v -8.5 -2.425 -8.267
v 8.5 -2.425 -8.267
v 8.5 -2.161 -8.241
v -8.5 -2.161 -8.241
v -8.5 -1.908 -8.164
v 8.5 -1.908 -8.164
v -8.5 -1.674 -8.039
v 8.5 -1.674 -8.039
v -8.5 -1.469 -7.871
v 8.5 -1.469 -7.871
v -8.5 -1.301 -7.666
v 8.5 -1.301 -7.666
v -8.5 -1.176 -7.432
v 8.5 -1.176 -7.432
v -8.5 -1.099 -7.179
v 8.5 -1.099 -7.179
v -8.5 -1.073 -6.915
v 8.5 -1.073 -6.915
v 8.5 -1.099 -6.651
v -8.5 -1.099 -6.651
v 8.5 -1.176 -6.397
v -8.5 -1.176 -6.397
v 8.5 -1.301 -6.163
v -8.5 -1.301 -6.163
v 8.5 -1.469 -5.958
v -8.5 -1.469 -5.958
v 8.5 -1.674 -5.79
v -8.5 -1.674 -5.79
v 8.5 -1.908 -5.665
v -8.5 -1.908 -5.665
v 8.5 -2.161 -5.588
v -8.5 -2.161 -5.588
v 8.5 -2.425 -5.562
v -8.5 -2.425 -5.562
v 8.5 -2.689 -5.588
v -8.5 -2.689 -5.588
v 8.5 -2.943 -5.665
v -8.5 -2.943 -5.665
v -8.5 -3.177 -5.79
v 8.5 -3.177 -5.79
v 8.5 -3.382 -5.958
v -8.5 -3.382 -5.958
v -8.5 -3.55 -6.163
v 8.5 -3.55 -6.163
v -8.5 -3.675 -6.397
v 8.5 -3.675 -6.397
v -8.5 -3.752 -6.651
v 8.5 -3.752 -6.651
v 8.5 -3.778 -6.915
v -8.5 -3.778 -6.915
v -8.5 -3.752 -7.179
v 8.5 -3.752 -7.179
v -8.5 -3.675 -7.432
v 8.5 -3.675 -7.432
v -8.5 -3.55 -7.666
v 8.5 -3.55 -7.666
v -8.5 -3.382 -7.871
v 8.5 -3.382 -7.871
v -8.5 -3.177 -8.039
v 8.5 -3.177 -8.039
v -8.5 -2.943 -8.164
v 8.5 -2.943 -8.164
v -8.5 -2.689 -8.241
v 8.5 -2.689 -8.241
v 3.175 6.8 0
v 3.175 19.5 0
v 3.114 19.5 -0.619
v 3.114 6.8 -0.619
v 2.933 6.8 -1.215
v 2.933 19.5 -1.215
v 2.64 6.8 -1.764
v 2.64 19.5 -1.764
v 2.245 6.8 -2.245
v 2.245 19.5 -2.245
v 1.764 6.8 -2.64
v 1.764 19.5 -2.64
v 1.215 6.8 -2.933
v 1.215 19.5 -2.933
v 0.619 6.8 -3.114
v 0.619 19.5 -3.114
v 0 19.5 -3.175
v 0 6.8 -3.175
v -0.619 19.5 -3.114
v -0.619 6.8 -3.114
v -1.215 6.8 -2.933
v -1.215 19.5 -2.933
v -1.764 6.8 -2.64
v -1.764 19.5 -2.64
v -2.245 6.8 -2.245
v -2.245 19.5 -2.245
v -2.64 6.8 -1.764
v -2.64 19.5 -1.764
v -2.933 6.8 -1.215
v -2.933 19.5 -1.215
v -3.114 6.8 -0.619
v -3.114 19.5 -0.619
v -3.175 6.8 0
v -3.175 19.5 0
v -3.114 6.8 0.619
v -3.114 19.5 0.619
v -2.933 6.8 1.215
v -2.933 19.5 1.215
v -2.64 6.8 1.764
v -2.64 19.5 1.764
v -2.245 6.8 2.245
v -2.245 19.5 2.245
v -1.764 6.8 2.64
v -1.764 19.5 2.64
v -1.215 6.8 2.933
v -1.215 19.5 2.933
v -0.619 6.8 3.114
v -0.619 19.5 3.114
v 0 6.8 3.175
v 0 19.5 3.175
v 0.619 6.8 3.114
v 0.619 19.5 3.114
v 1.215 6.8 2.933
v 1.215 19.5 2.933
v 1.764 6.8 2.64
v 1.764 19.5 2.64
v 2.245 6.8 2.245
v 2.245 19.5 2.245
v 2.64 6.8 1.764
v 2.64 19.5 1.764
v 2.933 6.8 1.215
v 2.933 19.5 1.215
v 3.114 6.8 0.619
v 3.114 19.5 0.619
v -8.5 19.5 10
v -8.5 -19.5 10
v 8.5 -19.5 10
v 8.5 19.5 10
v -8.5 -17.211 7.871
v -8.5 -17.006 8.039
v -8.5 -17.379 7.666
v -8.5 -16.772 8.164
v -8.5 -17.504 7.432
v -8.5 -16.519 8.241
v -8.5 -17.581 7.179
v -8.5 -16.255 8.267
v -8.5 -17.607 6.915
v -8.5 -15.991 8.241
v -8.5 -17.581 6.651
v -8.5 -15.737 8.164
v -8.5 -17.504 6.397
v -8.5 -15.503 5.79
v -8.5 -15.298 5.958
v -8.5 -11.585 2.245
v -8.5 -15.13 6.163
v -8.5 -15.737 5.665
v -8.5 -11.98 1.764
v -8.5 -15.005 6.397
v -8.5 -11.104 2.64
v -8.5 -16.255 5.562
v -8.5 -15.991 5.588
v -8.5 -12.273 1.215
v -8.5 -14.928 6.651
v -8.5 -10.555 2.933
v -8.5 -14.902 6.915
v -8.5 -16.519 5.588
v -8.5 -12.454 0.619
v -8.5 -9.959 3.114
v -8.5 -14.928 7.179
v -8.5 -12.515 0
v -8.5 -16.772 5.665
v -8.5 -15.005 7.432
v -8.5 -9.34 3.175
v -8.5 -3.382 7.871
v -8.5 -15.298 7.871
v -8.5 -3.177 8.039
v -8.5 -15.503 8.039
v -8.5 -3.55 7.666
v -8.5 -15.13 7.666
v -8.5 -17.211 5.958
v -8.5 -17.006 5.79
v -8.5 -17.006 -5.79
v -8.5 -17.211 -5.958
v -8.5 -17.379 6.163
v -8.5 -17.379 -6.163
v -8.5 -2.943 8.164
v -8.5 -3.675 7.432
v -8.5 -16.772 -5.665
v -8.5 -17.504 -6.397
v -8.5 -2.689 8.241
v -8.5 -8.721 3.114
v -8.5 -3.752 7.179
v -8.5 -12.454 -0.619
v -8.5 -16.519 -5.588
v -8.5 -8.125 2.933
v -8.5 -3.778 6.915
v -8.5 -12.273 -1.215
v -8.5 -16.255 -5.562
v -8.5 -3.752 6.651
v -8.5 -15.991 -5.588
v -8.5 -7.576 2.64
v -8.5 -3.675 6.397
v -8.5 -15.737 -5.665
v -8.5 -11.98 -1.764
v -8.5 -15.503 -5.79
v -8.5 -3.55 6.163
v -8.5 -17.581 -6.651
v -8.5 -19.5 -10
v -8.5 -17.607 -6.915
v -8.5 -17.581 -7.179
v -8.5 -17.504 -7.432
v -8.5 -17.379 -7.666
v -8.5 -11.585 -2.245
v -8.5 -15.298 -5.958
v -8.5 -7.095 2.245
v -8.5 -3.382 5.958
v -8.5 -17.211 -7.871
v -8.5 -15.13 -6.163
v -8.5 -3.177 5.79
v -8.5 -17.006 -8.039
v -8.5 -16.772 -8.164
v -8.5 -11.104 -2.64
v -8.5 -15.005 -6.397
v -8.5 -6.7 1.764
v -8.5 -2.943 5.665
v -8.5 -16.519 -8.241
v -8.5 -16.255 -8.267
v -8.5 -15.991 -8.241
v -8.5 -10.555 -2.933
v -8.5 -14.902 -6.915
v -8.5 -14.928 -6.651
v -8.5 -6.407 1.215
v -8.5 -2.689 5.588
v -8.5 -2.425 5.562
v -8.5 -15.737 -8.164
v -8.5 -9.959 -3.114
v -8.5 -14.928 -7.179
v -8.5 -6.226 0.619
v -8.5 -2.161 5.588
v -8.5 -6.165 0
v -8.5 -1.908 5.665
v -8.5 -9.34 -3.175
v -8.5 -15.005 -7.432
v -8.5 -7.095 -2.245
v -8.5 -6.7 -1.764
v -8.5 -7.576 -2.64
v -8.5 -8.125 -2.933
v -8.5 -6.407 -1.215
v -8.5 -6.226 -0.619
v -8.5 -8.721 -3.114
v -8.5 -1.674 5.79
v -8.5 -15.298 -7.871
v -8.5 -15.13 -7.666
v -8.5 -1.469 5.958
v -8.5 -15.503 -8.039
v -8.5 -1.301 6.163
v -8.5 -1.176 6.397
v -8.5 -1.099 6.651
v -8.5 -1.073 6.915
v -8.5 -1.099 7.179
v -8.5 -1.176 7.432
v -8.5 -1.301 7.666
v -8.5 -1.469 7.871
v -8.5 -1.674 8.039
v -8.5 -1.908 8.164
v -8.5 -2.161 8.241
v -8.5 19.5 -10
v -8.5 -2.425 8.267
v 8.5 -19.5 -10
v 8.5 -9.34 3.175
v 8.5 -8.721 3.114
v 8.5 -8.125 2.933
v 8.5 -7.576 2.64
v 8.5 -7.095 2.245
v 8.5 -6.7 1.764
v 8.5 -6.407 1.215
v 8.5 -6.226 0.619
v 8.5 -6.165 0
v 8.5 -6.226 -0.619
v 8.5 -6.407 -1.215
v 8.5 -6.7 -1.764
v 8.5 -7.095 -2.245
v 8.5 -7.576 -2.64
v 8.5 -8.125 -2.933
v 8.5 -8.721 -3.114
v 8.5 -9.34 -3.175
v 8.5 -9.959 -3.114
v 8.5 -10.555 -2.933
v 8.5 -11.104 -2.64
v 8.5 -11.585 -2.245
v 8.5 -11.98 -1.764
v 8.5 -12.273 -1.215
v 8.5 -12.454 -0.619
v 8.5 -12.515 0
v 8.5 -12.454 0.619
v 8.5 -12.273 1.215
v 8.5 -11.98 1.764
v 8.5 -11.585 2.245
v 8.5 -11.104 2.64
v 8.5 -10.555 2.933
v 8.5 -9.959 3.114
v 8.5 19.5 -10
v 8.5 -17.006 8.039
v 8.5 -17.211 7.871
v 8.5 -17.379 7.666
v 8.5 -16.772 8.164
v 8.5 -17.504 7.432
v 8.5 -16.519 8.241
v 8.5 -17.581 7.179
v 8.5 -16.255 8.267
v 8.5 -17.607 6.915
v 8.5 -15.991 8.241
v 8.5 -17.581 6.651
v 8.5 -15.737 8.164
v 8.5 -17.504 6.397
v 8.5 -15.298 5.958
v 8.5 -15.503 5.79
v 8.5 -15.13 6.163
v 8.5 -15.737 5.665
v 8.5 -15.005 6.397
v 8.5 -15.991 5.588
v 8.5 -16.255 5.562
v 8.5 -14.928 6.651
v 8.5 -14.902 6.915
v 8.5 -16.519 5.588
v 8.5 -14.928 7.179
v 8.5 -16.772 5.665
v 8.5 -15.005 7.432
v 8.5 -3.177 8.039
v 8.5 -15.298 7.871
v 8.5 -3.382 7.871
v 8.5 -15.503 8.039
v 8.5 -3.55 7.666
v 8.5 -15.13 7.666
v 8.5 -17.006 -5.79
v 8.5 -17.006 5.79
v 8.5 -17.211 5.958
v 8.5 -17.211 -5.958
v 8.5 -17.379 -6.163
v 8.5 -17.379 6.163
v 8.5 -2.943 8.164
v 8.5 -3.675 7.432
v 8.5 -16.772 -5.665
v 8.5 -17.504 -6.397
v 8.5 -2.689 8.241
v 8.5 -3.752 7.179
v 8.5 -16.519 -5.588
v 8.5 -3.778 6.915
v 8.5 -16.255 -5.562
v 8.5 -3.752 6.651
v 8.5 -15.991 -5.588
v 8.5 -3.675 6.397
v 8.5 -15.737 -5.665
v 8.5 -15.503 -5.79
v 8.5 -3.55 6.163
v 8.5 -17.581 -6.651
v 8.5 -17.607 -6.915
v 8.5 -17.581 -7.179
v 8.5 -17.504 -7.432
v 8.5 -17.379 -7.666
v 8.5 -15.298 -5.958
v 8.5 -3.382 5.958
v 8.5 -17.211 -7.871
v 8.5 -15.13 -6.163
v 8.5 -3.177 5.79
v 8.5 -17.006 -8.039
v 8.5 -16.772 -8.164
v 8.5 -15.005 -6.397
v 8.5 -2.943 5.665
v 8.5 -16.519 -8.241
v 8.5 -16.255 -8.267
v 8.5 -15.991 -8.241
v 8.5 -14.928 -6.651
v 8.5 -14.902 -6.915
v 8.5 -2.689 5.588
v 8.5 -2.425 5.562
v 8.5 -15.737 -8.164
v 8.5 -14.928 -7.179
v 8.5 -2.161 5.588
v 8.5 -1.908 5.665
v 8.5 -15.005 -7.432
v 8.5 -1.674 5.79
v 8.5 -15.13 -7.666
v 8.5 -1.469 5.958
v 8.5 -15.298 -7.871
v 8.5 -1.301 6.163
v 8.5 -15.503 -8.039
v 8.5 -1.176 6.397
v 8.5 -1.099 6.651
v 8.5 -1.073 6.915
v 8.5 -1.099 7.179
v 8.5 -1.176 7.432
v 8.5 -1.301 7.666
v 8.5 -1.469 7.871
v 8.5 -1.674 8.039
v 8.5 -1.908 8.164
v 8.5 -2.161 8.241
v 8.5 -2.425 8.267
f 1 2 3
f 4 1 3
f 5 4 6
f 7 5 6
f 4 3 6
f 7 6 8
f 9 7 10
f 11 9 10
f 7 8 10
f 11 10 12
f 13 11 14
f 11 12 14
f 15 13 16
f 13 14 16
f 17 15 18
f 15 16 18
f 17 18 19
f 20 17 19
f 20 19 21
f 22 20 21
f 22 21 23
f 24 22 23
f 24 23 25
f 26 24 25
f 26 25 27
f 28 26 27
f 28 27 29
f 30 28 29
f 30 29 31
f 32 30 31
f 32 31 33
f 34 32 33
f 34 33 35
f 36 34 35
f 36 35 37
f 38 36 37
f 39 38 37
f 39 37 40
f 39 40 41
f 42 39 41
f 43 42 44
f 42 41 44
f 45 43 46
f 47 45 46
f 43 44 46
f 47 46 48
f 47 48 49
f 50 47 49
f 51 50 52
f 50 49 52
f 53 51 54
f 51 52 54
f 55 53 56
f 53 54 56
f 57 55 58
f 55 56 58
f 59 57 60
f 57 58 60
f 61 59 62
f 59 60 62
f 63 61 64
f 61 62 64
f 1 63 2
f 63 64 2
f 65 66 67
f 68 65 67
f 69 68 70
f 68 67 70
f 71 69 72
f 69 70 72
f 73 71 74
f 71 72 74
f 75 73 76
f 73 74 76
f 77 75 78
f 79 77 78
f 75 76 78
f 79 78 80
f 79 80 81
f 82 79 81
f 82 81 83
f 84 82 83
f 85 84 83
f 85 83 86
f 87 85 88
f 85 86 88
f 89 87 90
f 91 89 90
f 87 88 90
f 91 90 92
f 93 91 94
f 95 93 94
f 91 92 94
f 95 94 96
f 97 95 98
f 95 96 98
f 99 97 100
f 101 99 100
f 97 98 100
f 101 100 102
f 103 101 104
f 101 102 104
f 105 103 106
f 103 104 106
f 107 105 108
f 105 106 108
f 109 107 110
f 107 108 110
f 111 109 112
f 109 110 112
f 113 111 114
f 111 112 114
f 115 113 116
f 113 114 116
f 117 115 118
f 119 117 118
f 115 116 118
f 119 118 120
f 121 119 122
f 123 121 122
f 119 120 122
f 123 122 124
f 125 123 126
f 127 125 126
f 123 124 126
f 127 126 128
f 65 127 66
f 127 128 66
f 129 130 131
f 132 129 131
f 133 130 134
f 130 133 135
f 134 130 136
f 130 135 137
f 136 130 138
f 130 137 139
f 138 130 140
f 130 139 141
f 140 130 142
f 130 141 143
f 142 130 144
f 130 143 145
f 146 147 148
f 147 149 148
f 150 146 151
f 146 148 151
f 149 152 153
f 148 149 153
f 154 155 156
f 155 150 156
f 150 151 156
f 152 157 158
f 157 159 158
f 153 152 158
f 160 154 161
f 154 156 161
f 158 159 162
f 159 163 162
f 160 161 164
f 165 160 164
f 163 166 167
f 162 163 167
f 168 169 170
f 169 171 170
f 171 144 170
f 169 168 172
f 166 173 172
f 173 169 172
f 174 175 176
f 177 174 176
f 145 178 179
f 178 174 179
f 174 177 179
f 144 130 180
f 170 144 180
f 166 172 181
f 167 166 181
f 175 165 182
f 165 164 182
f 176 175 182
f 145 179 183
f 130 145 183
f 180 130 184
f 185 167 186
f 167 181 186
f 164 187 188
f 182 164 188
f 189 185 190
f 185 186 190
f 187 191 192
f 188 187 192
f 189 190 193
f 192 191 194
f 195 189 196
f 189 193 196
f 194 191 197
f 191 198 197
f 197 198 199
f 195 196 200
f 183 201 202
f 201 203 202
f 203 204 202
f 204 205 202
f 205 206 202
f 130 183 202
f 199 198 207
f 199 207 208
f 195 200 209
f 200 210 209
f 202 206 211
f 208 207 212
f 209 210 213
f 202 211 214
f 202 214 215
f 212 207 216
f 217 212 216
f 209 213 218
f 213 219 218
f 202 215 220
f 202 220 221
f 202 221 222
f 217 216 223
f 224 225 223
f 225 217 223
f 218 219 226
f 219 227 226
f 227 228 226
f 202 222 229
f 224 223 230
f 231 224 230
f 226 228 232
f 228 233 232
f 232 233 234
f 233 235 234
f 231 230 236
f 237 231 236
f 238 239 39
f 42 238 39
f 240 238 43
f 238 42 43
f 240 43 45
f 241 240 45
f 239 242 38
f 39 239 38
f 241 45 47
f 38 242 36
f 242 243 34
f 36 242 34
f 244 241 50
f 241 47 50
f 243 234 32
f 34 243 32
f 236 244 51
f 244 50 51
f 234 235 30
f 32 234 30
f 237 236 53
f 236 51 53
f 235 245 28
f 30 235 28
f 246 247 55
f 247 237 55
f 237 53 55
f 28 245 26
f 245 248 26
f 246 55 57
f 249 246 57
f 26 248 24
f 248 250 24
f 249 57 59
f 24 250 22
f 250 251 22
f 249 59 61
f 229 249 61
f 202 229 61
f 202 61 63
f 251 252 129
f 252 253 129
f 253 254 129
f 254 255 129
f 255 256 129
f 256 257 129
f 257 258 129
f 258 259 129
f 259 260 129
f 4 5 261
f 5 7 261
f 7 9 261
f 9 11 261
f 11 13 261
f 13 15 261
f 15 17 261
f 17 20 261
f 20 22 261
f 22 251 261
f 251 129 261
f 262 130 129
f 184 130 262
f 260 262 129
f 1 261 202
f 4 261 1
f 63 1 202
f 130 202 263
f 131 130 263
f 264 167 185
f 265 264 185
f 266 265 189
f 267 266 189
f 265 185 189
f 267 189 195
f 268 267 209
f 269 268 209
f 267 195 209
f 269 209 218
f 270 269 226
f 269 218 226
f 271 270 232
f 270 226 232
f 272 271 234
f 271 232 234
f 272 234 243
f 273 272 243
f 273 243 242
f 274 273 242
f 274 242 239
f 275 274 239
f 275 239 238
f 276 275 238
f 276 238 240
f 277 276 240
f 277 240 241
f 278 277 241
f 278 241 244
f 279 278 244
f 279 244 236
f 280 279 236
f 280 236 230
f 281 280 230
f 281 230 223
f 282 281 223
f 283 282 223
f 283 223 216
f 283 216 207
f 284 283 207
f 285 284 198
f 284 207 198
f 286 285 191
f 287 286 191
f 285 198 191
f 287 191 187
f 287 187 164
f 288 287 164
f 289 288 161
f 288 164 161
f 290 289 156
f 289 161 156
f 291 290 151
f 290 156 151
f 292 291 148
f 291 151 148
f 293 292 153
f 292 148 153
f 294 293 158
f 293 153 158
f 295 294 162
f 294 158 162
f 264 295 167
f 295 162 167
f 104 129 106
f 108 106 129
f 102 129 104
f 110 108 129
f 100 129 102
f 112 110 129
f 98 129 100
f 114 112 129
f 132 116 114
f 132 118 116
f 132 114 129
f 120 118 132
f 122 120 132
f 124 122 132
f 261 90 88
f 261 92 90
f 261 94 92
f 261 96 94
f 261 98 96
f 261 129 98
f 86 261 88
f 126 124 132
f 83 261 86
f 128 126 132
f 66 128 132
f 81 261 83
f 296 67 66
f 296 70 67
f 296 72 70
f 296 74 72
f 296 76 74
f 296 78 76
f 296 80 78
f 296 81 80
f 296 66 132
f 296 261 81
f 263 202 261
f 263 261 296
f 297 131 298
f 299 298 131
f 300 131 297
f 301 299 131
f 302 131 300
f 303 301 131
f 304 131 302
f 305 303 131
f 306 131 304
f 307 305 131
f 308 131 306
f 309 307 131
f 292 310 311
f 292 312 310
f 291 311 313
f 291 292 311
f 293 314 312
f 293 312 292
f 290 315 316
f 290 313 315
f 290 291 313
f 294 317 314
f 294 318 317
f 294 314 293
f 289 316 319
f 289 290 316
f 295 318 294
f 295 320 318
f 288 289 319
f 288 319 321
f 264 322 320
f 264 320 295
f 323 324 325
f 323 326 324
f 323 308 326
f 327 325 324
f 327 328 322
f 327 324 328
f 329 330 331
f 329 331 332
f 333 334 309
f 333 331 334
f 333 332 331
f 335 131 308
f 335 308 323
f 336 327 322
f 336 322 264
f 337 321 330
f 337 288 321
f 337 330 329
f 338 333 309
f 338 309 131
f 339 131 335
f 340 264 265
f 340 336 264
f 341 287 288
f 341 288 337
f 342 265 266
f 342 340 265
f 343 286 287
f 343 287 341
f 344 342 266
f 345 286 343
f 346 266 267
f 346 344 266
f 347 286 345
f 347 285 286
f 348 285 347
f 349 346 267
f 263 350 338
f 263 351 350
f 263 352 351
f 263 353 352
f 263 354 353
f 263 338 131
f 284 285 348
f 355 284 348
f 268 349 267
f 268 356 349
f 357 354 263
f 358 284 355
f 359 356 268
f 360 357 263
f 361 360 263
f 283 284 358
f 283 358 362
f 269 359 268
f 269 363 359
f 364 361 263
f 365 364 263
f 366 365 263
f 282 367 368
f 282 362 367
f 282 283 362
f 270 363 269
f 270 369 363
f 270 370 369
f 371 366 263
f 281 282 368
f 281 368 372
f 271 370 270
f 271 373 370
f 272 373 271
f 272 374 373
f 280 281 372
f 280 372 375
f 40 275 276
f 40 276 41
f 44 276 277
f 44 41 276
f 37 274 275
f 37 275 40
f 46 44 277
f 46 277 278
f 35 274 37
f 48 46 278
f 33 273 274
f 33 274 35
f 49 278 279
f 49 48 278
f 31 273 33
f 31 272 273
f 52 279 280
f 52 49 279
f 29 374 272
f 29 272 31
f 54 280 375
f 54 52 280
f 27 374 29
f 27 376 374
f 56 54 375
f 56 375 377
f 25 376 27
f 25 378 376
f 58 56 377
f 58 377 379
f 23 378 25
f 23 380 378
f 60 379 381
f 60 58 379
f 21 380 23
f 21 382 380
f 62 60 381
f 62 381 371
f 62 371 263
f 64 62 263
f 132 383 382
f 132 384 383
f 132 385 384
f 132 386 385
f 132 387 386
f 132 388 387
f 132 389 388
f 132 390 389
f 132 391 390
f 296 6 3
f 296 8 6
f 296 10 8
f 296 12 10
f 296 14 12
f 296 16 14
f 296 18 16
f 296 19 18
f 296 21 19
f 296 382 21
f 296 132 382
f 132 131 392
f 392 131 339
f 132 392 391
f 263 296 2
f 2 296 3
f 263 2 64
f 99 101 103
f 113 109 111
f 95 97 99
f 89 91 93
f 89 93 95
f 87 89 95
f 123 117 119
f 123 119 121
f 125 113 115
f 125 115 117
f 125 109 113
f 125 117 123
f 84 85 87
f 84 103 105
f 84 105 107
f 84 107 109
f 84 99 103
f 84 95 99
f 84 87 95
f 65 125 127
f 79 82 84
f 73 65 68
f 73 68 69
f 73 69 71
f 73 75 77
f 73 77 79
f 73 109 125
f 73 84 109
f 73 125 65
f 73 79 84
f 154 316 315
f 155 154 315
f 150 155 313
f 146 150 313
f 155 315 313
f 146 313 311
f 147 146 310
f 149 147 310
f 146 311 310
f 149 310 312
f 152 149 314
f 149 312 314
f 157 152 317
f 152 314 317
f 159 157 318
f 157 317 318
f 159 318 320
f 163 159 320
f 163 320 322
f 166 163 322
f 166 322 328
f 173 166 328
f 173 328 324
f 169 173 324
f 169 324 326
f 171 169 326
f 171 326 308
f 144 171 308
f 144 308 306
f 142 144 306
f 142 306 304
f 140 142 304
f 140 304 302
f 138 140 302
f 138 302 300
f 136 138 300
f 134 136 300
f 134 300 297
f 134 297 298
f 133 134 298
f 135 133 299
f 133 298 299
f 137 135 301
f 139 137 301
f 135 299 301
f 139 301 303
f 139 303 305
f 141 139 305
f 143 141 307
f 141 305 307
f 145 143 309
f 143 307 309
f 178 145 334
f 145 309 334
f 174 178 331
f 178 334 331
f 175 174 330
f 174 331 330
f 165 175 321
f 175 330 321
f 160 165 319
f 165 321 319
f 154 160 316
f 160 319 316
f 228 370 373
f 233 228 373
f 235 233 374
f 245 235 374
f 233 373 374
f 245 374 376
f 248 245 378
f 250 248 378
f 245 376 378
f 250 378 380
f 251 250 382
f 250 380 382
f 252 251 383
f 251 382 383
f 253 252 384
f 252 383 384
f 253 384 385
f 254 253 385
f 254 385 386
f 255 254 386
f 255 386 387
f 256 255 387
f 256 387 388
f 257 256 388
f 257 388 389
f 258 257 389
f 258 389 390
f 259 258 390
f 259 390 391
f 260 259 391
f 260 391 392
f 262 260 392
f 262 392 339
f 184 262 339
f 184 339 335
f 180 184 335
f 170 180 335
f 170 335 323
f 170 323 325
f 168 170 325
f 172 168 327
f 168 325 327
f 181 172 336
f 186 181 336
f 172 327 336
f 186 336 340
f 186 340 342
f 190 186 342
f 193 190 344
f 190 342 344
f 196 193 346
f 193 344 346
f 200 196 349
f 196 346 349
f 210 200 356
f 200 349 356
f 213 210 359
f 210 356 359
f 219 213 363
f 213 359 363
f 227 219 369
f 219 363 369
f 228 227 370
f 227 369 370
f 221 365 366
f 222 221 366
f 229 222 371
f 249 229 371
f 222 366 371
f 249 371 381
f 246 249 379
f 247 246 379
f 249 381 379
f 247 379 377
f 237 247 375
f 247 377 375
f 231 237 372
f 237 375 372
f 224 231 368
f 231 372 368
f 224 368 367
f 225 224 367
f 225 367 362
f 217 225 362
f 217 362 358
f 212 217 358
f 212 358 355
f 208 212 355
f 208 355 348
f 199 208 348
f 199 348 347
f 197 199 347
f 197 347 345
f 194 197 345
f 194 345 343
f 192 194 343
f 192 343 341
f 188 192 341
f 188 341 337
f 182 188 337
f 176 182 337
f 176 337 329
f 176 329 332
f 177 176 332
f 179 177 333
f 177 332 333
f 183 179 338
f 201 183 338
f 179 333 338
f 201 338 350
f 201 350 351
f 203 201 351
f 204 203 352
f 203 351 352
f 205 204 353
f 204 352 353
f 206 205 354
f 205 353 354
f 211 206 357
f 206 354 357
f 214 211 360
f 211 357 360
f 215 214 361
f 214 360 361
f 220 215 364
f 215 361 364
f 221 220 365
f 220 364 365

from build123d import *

# Parameters (mm, degrees)
ESQUISSE1_W             = 17
ESQUISSE1_H             = 20
BOSS_EXTRU_1_DEPTH      = 19.5
ESQUISSE2_R             = 3.175
ENL_V_MAT_EXTRU_1_DEPTH = 18
ESQUISSE3_R             = 3.175
ENL_V_MAT_EXTRU_2_DEPTH = 12.7
ESQUISSE4_R             = 1.35255
ENL_V_MAT_EXTRU_3_DEPTH = 18


with BuildPart() as part:
    # Esquisse1 → Boss.-Extru.1 (new body, symmetric)
    with BuildSketch(Plane(origin=(0, 0, 0), x_dir=(1, 0, 0), z_dir=(0, 1, 0))):
        Rectangle(ESQUISSE1_W, ESQUISSE1_H)
    extrude(amount=BOSS_EXTRU_1_DEPTH, both=True)

    # Esquisse2 → Enlèv. mat.-Extru.1 (cut, through all)
    with BuildSketch(Plane.ZY.offset(8.5)):
        with Locations((0, -9.34)):
            Circle(ESQUISSE2_R)
    extrude(amount=-ENL_V_MAT_EXTRU_1_DEPTH, mode=Mode.SUBTRACT)

    # Esquisse3 → Enlèv. mat.-Extru.2 (cut)
    with BuildSketch(Plane(origin=(0, 19.5, 0), x_dir=(1, 0, 0), z_dir=(0, 1, 0))):
        Circle(ESQUISSE3_R)
    extrude(amount=-ENL_V_MAT_EXTRU_2_DEPTH, mode=Mode.SUBTRACT)

    # Esquisse4 → Enlèv. mat.-Extru.3 (cut, through all)
    with BuildSketch(Plane(origin=(8.5, 0, 0), x_dir=(0, 0, -1), z_dir=(1, 0, 0))):
        with Locations((-6.914797213, -2.425202787)):
            Circle(ESQUISSE4_R)
        with Locations((6.914797213, -2.425202787)):
            Circle(ESQUISSE4_R)
        with Locations((-6.914797213, -16.254797213)):
            Circle(ESQUISSE4_R)
        with Locations((6.914797213, -16.254797213)):
            Circle(ESQUISSE4_R)
    extrude(amount=-ENL_V_MAT_EXTRU_3_DEPTH, mode=Mode.SUBTRACT)


solid = part.part
